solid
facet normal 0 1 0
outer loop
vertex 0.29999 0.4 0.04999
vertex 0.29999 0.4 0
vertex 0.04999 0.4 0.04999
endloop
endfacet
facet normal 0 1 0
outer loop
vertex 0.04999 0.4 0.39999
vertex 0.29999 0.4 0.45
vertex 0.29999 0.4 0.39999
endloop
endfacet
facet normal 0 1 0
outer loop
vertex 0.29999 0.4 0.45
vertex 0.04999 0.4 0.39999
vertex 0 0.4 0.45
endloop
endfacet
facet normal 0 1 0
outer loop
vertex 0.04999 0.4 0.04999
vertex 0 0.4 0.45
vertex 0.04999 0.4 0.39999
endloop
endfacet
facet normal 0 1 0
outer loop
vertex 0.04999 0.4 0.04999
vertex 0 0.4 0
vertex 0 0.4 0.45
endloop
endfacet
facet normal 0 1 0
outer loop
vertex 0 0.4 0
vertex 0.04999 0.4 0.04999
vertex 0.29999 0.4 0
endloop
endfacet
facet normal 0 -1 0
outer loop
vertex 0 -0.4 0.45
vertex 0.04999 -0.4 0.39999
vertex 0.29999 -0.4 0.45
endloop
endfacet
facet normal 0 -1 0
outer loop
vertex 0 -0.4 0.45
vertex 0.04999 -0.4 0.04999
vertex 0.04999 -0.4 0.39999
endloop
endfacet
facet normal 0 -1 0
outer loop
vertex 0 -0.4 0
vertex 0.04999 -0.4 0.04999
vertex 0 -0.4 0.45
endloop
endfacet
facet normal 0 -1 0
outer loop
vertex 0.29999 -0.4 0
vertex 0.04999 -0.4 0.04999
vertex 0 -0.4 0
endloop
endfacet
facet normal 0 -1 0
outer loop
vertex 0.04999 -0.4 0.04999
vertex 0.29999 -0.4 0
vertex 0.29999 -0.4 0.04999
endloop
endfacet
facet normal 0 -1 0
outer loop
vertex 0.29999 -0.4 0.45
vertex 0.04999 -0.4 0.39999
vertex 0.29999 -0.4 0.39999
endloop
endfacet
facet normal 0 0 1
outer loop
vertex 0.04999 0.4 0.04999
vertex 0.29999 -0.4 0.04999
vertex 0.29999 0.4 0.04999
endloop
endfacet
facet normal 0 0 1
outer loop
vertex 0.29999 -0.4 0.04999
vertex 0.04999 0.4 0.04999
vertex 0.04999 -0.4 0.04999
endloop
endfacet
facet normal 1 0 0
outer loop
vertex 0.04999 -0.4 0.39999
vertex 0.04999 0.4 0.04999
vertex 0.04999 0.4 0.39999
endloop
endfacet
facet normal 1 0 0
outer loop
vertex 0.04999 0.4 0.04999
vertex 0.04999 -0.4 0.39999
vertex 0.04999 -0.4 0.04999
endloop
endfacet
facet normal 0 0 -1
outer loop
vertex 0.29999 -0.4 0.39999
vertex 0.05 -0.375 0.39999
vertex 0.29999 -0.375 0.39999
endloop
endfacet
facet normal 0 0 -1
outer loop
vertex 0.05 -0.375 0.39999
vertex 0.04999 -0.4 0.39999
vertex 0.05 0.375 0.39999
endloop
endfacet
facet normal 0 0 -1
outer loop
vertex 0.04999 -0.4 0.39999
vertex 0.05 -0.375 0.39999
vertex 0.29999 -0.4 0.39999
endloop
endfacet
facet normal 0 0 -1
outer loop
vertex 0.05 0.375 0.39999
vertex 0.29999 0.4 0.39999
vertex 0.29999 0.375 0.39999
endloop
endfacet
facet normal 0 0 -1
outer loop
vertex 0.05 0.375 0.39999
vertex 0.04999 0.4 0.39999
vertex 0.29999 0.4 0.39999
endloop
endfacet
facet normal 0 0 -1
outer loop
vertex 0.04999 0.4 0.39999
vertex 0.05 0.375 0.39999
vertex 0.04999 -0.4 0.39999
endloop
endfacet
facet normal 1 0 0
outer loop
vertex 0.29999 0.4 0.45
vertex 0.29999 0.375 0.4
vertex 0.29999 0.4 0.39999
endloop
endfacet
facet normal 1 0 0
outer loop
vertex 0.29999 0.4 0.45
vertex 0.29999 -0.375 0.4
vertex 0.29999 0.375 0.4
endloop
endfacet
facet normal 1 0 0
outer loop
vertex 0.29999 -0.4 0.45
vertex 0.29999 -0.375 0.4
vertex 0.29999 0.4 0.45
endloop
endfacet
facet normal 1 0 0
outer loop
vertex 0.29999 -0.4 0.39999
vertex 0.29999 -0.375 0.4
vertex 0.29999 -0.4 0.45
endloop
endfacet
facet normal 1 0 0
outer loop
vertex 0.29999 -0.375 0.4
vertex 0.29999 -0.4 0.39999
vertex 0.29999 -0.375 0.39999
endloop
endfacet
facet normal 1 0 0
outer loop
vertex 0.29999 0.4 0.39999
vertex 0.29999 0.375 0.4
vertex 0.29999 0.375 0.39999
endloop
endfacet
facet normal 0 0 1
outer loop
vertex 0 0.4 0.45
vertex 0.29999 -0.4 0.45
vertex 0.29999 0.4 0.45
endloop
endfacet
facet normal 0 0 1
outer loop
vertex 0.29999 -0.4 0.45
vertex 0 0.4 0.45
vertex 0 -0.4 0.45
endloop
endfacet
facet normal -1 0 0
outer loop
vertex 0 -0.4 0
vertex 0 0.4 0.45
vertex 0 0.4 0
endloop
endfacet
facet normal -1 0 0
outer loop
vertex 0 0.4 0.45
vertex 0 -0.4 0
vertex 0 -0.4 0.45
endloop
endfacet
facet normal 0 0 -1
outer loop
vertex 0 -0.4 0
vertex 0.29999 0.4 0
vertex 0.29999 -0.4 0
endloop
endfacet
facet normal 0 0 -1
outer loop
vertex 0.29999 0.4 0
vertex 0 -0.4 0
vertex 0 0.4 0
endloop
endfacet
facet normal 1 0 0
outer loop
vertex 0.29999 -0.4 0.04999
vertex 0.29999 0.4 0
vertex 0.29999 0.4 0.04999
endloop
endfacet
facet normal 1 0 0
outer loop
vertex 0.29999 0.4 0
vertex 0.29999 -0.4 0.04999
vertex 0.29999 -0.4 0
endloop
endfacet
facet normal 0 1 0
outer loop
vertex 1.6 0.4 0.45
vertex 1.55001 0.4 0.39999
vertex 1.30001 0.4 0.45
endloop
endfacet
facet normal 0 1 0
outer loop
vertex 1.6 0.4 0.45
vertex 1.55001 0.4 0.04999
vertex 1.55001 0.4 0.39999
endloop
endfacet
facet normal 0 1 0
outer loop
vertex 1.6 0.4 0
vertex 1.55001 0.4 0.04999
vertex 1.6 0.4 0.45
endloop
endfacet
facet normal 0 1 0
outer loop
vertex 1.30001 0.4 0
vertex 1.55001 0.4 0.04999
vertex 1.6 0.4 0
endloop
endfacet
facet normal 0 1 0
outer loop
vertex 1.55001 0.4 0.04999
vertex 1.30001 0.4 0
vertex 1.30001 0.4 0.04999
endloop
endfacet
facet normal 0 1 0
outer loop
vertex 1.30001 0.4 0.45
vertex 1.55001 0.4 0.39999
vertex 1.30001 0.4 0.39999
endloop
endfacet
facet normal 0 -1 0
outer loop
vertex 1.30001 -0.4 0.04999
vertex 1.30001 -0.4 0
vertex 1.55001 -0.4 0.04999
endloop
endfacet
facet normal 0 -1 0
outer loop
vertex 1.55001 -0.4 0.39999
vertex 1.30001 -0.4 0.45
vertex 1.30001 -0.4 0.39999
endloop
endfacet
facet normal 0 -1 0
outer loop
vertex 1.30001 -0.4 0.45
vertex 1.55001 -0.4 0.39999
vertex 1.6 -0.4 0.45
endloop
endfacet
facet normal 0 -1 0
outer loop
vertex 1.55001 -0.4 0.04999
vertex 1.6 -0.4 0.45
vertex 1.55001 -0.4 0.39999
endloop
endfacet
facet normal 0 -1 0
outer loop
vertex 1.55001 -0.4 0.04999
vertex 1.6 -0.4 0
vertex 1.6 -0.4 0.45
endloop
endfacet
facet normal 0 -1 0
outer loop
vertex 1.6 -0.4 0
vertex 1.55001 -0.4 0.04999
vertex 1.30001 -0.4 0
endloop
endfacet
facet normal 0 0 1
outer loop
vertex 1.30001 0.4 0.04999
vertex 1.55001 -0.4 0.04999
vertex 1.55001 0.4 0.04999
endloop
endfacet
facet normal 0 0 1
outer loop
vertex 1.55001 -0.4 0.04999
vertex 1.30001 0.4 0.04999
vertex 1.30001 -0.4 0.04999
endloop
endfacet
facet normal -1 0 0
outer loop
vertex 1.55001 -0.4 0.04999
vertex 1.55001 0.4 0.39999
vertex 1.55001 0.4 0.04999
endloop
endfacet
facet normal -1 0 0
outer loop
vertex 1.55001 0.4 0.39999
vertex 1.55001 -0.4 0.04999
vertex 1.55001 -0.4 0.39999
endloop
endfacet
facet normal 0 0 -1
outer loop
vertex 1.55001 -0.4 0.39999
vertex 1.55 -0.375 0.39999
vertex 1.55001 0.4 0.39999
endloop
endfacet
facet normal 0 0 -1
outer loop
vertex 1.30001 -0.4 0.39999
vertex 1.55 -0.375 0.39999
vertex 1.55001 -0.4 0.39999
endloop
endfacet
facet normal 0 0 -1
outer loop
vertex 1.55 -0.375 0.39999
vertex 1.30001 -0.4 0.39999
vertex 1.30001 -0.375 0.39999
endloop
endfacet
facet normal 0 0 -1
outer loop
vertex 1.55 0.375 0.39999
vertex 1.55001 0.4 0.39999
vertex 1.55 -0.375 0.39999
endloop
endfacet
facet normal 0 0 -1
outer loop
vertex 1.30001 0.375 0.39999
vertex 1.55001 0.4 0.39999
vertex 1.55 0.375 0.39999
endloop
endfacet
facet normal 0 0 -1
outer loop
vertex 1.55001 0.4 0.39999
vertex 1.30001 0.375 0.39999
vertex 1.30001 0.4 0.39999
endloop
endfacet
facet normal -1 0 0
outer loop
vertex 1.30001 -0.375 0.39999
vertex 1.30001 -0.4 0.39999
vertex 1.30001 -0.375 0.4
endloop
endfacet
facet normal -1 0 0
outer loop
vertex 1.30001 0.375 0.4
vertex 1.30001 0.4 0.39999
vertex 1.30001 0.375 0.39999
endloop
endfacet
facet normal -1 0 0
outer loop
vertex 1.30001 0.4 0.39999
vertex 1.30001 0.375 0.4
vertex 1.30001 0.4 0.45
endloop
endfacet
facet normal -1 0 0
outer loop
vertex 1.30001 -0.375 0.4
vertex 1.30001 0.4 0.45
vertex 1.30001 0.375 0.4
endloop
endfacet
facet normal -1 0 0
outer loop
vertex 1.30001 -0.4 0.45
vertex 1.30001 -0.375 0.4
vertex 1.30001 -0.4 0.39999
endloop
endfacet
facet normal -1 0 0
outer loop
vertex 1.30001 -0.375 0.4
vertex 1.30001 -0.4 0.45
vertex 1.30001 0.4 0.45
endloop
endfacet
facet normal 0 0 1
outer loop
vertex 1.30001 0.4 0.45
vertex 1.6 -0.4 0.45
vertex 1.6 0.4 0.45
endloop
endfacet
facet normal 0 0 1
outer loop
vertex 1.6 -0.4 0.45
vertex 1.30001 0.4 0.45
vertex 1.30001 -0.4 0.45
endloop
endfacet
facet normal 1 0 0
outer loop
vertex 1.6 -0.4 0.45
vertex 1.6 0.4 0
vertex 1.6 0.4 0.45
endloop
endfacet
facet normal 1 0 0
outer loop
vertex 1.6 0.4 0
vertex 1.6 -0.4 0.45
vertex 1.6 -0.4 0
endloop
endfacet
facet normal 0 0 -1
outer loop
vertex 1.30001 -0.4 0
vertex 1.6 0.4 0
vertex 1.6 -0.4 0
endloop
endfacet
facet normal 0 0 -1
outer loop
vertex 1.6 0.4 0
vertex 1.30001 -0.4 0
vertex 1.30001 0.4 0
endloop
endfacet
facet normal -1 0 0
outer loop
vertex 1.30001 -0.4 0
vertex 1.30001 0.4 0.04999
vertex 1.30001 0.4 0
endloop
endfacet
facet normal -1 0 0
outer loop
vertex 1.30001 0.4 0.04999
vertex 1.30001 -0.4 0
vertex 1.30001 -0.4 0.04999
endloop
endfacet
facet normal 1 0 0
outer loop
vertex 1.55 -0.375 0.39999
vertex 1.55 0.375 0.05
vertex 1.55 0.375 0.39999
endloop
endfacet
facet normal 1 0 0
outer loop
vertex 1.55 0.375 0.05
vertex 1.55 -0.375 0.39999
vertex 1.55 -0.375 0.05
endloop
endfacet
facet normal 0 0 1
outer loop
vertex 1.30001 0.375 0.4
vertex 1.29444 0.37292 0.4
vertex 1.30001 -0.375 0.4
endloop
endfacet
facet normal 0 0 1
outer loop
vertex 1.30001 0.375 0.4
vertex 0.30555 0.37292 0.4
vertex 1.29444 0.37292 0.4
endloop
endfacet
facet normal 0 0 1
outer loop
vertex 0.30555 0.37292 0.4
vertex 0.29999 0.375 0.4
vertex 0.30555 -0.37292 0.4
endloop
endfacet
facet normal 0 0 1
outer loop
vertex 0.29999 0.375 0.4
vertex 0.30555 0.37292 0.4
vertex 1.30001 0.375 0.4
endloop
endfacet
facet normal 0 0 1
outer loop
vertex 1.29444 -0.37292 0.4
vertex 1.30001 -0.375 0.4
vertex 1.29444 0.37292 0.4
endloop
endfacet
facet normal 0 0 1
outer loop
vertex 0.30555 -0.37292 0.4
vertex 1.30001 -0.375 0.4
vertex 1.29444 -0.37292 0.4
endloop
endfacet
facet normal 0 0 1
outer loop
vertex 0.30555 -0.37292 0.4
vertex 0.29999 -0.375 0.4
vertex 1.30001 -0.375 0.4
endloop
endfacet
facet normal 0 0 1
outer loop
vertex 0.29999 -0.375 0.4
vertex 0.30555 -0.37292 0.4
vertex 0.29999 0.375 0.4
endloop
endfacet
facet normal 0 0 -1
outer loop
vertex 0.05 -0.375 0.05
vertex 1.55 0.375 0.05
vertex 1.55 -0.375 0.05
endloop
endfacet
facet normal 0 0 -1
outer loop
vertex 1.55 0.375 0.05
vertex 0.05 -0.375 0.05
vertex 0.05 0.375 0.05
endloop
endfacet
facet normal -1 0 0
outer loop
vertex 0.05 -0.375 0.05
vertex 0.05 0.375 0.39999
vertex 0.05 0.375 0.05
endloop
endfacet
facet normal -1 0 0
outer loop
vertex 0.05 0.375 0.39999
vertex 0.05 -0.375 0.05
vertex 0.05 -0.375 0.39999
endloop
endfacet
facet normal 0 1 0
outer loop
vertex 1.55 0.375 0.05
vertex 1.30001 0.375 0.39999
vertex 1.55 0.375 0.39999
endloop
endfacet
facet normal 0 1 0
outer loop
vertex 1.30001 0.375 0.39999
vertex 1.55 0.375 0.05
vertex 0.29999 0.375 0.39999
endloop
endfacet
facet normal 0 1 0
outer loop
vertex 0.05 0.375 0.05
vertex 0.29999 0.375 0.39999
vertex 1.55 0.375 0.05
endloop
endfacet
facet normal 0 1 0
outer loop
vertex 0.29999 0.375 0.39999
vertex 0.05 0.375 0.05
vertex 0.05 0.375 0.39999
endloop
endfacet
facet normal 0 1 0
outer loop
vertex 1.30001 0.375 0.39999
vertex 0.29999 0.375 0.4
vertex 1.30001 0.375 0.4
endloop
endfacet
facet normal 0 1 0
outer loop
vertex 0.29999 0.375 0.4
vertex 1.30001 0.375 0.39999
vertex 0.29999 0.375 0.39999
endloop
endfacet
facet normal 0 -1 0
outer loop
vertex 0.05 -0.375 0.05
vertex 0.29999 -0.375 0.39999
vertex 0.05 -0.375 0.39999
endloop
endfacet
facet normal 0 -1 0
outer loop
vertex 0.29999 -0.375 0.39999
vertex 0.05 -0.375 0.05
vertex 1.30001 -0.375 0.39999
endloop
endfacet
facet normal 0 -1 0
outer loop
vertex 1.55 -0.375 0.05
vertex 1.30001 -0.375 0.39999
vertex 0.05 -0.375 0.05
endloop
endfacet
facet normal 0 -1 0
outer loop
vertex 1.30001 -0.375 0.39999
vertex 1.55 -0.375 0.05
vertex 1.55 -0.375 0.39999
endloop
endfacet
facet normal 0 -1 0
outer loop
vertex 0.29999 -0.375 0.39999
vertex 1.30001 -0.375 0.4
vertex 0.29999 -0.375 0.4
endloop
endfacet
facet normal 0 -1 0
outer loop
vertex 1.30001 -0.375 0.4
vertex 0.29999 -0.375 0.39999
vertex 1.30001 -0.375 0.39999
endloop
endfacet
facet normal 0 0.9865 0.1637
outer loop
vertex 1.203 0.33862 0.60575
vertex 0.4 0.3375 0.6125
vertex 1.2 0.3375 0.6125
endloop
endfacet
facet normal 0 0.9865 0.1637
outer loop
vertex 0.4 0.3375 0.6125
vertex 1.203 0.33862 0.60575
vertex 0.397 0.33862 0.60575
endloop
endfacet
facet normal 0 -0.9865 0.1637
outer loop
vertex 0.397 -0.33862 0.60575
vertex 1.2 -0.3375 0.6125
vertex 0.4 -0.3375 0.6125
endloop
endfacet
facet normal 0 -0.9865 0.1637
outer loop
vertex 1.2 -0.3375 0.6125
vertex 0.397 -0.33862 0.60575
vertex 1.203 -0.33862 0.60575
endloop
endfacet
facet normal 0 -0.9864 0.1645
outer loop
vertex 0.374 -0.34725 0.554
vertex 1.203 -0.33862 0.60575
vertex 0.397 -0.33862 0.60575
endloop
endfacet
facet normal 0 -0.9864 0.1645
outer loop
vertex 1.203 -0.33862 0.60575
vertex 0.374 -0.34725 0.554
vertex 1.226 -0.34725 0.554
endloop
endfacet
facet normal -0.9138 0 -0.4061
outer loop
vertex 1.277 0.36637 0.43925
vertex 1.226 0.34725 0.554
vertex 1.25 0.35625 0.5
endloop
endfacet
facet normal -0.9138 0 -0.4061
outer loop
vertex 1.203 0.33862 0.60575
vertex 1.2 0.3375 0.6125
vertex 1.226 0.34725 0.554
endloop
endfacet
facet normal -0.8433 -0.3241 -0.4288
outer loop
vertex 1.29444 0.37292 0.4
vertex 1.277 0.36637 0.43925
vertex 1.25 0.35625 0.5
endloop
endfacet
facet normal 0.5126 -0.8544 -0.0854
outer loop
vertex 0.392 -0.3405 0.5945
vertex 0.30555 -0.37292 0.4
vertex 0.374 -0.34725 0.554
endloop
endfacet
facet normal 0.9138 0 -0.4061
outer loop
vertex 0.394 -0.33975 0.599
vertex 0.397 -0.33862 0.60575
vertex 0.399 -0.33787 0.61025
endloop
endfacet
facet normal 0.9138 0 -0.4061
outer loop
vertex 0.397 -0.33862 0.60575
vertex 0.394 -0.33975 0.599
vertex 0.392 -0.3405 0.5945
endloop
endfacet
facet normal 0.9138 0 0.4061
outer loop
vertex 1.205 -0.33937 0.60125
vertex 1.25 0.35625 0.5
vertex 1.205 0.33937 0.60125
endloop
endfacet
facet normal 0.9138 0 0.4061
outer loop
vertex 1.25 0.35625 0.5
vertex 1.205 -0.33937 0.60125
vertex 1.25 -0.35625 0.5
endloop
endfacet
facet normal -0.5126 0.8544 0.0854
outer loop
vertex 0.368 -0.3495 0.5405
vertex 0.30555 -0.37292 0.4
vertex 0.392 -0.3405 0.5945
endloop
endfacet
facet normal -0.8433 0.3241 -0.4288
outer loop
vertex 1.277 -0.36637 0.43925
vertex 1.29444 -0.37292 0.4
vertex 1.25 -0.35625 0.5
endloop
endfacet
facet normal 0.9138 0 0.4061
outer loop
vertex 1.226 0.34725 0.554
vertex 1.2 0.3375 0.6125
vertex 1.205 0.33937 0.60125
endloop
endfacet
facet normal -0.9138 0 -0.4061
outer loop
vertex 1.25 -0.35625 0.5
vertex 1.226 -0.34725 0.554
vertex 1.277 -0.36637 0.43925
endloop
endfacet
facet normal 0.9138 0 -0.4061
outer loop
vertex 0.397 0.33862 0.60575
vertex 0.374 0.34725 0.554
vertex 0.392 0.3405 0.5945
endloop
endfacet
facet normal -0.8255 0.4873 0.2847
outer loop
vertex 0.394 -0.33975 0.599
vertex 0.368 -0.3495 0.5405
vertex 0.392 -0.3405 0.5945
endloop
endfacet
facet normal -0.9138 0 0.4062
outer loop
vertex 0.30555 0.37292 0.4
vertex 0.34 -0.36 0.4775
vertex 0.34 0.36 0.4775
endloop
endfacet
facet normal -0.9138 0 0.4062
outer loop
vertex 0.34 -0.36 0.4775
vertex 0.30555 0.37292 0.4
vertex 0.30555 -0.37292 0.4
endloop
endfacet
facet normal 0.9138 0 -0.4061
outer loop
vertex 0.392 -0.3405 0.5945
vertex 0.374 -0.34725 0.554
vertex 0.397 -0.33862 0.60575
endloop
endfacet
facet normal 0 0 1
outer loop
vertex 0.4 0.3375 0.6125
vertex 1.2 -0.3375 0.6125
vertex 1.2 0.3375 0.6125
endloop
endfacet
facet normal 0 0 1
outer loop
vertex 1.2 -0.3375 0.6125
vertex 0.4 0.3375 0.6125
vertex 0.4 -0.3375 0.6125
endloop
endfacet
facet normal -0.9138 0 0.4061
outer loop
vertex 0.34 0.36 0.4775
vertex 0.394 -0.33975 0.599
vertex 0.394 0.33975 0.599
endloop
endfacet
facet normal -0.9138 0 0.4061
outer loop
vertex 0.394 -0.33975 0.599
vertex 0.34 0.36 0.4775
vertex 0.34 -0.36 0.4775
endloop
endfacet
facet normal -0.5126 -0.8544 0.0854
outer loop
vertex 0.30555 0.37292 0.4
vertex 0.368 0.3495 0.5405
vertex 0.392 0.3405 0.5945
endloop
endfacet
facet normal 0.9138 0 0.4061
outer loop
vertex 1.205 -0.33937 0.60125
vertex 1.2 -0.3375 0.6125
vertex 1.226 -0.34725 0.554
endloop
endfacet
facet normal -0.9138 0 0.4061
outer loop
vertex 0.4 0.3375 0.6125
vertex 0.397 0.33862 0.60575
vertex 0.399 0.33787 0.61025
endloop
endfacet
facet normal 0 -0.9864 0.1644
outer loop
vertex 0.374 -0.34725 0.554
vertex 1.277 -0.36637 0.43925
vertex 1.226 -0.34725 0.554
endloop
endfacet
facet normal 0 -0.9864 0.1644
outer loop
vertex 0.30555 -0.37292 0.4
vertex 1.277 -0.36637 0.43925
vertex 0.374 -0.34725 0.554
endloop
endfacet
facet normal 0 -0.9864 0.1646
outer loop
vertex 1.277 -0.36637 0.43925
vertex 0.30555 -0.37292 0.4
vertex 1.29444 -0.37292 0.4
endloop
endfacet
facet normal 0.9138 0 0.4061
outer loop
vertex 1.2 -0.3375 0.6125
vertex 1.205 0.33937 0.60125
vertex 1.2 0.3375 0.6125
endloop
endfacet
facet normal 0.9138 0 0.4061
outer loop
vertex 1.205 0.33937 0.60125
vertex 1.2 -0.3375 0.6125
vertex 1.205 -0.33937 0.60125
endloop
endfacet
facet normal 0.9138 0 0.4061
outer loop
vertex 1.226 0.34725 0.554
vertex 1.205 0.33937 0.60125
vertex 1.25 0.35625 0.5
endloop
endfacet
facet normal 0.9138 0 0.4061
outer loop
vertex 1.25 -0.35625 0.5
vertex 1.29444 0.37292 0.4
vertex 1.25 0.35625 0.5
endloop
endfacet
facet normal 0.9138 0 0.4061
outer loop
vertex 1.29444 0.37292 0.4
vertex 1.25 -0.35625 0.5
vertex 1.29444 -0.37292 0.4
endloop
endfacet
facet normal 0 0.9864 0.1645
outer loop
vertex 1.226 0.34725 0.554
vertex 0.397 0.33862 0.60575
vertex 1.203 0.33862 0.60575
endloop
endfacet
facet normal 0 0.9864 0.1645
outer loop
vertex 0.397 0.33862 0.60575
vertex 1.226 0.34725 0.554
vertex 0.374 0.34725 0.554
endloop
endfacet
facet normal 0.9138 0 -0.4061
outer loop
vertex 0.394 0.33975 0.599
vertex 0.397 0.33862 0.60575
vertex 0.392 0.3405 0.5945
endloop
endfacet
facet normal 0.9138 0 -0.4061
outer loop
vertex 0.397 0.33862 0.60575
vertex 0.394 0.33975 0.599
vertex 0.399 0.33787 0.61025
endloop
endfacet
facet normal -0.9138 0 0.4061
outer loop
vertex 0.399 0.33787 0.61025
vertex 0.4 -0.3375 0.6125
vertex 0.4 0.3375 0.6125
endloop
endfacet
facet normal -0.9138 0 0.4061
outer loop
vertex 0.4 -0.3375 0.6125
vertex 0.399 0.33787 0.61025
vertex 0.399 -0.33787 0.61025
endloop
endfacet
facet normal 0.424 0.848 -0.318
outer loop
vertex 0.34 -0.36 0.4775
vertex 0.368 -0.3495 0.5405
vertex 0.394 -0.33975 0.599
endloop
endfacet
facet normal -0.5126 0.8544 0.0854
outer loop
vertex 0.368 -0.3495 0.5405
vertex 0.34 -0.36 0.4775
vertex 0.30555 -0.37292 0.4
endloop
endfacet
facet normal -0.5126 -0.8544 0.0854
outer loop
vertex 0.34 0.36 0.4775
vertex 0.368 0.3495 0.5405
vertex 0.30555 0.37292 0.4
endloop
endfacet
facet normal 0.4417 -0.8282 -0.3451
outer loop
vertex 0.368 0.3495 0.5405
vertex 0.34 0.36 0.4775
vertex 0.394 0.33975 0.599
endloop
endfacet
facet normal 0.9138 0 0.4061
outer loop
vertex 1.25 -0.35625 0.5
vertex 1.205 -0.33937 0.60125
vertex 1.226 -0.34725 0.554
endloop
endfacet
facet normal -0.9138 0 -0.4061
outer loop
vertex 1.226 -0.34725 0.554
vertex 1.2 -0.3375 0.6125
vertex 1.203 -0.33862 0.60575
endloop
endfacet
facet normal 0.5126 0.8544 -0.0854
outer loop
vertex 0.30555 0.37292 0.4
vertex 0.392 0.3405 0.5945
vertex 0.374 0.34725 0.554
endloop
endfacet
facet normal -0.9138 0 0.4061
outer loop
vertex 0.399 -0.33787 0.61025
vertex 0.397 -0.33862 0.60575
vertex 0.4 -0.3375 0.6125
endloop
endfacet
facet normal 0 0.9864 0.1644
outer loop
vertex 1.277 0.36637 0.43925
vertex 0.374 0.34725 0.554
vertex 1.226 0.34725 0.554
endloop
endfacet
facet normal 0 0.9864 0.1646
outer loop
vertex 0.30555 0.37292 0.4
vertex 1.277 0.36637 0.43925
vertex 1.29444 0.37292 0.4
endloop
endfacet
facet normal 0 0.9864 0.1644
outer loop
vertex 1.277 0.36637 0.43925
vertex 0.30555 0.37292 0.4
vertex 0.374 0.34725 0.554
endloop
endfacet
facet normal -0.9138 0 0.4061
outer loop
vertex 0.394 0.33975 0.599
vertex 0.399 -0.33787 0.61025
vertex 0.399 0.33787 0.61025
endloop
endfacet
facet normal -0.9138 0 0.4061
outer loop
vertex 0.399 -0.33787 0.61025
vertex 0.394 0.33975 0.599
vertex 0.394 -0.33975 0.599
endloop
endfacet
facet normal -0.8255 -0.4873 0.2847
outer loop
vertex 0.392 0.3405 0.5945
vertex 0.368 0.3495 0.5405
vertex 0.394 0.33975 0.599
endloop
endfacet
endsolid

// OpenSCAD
// Can be 00105,0201,0402,0603,0805,1206,1210,2010 or 2512

function get_th(type) =
    type=="00105" ? 0.02:
    type=="0201" ? 0.03:
    type=="0402" ? 0.04: 0.05;

function get_l(type) =
    type=="00105" ? 0.4:
    type=="0201" ? 0.6:
    type=="0402" ? 1.0:
    type=="0603" ? 1.6:
    type=="0805" ? 2.0 :
	type=="1206" ? 3.1:
	type=="1210" ? 3.2:
	type=="2010" ? 5.0:
	type=="2512" ? 6.35: 0;

function get_w(type) =
    type=="00105" ? 0.2:
    type=="0201" ? 0.3:
    type=="0402" ? 0.5:
    type=="0603" ? 0.8:
    type=="0805" ? 1.25 :
	type=="1206" ? 1.55:
	type=="1210" ? 2.6:
	type=="2010" ? 2.5:
	type=="2512" ? 3.2: 0;

function get_t(type) =
    type=="00105" ? 0.13:
    type=="0201" ? 0.23:
    type=="0402" ? 0.35:
    type=="0603" ? 0.45:
    type=="0805" ? 0.5 :
	type=="1206" ? 0.55:
	type=="1210" ? 0.55:
	type=="2010" ? 0.55:
	type=="2512" ? 0.55: 0;

function get_d1(type) =
    type=="00105" ? 0.1:
    type=="0201" ? 0.15:
    type=="0402" ? 0.20:
    type=="0603" ? 0.30:
    type=="0805" ? 0.35:
	type=="1206" ? 0.50:
	type=="1210" ? 0.50:
	type=="2010" ? 0.60:
	type=="2512" ? 0.60: 0;

function get_d2(type) =
    type=="00105" ? 0.1:
    type=="0201" ? 0.15:
    type=="0402" ? 0.20:
    type=="0603" ? 0.30:
    type=="0805" ? 0.40:
	type=="1206" ? 0.50:
	type=="1210" ? 0.50:
	type=="2010" ? 0.50:
	type=="2512" ? 0.50: 0;

pin_color = "#A0A0A0";
body_color = "#E0E0E0";

module pin(type)
{
    color(pin_color)
    rotate([90,0,0])
    linear_extrude(height = get_w(type), center = true, convexity = 10, twist = 0)
    polygon([
        [0,0],
        [get_d2(type),0],
        [get_d2(type),get_th(type)],
        [get_th(type),get_th(type)],
        [get_th(type),get_t(type)-get_th(type)],
        [get_d1(type),get_t(type)-get_th(type)],
        [get_d1(type),get_t(type)],
        [0,get_t(type)]]);
}

module led_smd(type, led_color)
{
    union()
    {
        pin(type);
        translate([get_l(type),0,0])
        mirror([1,0,0])
        pin(type);

        color(body_color)
        translate([get_th(type),-(get_w(type)-get_th(type))/2,get_th(type)])
        cube([get_l(type)-get_th(type)*2,get_w(type)-get_th(type),get_t(type)-get_th(type)*2]);

        color(led_color)
        translate([get_l(type)/2,0,get_t(type)+get_th(type)])
        linear_extrude(height = get_t(type)/2, center = true, convexity = 10, scale=[0.8,0.9], $fn=100)    
        polygon(points=[
            [-get_l(type)/2+get_d1(type),-get_w(type)/2+get_th(type)/2],
            [get_l(type)/2-get_d1(type),-get_w(type)/2+get_th(type)/2],
            [get_l(type)/2-get_d1(type),get_w(type)/2-get_th(type)/2],
            [-get_l(type)/2+get_d1(type),get_w(type)/2-get_th(type)/2]
            ], paths=[[0,1,2,3]]);
    }
}

led_smd("0603", "#FF0000");
